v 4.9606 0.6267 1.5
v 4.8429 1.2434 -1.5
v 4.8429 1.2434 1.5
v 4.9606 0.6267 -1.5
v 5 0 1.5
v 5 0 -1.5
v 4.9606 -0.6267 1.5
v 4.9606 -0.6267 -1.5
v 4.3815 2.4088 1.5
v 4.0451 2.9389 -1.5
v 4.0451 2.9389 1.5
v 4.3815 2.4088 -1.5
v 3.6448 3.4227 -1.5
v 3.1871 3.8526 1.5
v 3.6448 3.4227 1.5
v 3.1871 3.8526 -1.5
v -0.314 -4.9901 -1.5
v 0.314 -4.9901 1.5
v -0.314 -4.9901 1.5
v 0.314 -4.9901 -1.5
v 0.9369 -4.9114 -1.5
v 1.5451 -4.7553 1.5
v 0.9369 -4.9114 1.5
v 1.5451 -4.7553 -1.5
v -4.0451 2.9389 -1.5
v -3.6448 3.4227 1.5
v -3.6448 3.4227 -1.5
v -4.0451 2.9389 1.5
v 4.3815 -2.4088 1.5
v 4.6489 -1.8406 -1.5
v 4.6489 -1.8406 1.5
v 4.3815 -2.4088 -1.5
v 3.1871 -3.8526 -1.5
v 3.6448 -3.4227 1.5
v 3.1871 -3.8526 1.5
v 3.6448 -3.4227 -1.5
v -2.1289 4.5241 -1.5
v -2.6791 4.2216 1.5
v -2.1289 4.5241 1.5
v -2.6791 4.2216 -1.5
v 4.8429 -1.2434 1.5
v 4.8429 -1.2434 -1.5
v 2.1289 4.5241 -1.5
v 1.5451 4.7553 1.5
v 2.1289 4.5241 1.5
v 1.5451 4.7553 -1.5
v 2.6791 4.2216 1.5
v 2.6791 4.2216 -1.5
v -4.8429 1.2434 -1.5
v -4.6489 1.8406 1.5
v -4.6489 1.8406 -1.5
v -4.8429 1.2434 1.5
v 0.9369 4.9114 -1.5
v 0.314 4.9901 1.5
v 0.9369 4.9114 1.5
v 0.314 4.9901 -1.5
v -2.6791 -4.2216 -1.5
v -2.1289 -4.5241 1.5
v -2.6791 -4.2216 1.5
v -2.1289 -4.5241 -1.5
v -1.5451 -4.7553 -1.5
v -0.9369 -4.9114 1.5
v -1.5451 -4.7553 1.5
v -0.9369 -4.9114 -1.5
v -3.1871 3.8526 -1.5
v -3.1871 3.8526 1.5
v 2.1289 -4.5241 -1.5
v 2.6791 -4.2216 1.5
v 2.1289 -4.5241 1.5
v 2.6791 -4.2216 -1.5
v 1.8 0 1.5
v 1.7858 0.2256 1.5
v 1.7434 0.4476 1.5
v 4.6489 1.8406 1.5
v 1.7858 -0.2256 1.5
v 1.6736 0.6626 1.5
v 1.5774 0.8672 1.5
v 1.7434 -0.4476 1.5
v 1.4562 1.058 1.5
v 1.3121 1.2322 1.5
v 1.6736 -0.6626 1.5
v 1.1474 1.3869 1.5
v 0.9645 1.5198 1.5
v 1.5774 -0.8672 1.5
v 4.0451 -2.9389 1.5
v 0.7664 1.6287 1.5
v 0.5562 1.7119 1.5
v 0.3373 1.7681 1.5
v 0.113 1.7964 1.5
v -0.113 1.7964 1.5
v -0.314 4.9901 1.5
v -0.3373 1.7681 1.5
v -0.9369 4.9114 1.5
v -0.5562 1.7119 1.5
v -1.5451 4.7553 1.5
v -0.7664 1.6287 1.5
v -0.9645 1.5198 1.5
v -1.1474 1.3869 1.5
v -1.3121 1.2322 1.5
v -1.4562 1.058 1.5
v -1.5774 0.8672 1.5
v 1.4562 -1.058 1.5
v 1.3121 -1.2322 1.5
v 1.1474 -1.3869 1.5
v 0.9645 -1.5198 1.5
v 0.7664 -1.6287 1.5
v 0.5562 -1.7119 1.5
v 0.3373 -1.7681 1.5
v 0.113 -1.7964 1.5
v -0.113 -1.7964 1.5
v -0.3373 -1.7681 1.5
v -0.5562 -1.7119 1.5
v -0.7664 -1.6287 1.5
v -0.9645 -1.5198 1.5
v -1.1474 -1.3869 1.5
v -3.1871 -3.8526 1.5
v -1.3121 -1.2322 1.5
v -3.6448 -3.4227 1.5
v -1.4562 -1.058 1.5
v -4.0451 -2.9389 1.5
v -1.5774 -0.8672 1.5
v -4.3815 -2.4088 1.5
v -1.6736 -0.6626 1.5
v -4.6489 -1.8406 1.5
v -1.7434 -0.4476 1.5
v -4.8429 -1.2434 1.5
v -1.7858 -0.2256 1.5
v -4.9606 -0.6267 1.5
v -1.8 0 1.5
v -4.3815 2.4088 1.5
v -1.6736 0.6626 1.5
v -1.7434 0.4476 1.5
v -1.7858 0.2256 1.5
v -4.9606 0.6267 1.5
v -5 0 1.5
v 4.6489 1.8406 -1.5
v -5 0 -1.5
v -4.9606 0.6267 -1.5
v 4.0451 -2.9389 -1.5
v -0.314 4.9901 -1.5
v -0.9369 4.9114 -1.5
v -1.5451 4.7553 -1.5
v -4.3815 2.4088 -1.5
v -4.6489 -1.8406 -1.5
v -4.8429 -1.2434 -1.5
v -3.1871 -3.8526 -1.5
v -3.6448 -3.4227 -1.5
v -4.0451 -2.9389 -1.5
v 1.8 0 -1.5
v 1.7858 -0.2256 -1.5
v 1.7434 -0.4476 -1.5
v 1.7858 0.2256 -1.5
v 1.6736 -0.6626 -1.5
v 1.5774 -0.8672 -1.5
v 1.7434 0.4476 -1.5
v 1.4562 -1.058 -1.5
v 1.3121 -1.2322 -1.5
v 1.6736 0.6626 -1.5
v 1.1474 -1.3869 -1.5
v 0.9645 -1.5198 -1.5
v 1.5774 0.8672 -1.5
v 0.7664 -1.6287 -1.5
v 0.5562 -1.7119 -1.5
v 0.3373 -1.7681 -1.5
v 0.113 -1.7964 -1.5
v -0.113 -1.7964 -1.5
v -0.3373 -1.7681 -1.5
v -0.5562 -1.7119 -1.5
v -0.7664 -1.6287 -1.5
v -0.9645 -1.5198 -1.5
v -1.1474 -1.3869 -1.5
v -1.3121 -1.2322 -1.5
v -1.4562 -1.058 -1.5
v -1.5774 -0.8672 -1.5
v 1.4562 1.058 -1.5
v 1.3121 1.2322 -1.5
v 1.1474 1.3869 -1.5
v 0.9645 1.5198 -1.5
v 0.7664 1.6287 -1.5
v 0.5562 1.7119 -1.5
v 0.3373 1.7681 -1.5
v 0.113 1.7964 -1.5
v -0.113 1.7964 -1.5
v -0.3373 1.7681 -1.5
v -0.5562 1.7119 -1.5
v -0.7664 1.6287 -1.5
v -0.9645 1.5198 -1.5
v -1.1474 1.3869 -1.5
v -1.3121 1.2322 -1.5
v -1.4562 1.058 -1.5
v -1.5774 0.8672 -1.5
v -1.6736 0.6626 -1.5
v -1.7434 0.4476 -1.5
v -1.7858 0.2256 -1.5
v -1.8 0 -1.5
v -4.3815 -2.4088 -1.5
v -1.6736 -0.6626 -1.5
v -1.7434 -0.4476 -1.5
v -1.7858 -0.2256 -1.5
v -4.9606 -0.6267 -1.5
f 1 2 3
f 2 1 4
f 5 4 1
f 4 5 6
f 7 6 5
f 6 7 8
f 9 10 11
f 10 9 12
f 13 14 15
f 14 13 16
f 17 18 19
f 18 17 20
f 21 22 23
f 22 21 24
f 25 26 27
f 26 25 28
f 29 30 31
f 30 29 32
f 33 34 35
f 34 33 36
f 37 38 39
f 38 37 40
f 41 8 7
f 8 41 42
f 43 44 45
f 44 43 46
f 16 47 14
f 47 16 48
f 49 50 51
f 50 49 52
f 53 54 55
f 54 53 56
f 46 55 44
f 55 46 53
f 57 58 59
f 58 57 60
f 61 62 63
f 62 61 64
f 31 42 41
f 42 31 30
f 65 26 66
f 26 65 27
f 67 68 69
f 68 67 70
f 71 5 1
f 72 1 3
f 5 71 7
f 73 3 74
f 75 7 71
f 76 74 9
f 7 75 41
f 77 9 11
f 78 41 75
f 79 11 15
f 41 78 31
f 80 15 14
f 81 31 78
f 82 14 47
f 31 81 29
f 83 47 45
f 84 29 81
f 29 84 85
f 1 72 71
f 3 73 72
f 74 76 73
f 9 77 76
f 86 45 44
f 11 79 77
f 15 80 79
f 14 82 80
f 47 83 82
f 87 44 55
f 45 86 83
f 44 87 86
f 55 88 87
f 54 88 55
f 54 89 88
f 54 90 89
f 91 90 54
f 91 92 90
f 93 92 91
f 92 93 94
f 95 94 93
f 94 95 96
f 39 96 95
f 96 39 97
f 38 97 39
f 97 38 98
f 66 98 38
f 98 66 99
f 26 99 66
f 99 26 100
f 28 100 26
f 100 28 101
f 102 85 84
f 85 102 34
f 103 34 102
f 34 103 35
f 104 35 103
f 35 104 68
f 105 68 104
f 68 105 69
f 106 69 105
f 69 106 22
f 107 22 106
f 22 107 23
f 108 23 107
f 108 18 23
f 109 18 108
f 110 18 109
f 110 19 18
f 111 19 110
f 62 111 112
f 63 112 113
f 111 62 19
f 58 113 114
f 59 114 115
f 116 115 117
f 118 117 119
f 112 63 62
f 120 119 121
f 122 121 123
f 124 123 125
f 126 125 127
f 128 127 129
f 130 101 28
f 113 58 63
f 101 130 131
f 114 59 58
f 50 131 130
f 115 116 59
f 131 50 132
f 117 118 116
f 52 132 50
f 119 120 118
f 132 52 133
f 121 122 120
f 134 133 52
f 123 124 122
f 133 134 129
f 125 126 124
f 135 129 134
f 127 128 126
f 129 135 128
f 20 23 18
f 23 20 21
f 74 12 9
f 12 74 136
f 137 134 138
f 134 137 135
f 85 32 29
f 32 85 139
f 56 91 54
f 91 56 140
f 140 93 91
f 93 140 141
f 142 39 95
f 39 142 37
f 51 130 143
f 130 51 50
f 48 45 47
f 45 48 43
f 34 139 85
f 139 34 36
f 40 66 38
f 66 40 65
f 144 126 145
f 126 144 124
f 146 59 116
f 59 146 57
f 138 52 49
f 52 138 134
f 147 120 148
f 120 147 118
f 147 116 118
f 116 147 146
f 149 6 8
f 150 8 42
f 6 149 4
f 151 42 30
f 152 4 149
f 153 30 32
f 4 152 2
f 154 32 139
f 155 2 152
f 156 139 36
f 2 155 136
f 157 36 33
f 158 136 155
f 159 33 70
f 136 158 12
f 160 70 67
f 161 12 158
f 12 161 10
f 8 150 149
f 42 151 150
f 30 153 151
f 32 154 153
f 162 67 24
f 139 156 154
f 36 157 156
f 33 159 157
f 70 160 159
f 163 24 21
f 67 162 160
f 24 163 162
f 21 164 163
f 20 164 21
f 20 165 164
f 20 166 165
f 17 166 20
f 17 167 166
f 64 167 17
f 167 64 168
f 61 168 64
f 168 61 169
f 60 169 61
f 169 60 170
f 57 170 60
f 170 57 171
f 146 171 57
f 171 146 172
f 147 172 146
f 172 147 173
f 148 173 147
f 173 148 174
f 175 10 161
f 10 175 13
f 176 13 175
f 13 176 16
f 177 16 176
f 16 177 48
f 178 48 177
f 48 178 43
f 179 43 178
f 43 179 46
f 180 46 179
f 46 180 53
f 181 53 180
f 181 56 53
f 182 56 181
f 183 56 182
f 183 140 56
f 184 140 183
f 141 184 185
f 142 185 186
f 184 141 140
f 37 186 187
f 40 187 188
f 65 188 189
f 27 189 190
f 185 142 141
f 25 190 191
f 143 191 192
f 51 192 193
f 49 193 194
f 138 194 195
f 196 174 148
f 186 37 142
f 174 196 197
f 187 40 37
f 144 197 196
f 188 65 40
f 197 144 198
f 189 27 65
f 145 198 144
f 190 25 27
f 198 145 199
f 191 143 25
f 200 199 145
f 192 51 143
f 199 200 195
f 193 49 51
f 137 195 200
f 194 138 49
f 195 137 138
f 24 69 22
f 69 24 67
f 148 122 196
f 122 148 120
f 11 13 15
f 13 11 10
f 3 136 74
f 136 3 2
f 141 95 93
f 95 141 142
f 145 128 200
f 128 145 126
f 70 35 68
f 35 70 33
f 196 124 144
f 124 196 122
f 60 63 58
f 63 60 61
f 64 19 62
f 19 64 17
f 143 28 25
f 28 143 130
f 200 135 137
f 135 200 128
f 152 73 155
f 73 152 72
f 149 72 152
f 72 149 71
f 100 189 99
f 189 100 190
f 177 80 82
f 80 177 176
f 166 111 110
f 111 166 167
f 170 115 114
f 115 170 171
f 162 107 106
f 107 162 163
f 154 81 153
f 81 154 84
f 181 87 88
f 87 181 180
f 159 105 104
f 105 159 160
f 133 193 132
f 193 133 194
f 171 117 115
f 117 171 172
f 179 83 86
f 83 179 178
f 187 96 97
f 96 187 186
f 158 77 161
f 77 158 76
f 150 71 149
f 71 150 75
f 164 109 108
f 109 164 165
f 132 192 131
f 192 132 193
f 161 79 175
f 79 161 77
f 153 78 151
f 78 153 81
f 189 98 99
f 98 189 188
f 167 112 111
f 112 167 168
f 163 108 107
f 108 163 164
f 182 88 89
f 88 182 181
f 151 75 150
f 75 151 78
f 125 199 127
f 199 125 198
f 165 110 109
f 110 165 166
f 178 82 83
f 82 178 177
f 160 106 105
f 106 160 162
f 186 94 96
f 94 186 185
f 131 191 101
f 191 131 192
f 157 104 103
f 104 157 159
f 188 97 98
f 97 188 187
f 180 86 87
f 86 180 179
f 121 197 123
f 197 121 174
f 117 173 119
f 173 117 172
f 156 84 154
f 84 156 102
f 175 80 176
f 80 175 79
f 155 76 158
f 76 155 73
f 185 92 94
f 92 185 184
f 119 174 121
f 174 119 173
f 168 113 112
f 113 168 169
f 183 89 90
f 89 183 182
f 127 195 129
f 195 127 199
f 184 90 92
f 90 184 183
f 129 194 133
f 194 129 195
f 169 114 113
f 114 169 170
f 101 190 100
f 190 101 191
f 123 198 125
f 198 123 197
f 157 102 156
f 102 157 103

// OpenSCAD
$fn = 50;


difference() {
	union() {
		translate(v = [0, 0, -1.5000000000]) {
			cylinder(h = 3, r = 5.0000000000);
		}
		translate(v = [0, 0, -1.5000000000]) {
			cylinder(h = 3, r = 2.8500000000);
		}
	}
	union() {
		translate(v = [0, 0, -50.0000000000]) {
			cylinder(h = 100, r = 1.8000000000);
		}
	}
}
